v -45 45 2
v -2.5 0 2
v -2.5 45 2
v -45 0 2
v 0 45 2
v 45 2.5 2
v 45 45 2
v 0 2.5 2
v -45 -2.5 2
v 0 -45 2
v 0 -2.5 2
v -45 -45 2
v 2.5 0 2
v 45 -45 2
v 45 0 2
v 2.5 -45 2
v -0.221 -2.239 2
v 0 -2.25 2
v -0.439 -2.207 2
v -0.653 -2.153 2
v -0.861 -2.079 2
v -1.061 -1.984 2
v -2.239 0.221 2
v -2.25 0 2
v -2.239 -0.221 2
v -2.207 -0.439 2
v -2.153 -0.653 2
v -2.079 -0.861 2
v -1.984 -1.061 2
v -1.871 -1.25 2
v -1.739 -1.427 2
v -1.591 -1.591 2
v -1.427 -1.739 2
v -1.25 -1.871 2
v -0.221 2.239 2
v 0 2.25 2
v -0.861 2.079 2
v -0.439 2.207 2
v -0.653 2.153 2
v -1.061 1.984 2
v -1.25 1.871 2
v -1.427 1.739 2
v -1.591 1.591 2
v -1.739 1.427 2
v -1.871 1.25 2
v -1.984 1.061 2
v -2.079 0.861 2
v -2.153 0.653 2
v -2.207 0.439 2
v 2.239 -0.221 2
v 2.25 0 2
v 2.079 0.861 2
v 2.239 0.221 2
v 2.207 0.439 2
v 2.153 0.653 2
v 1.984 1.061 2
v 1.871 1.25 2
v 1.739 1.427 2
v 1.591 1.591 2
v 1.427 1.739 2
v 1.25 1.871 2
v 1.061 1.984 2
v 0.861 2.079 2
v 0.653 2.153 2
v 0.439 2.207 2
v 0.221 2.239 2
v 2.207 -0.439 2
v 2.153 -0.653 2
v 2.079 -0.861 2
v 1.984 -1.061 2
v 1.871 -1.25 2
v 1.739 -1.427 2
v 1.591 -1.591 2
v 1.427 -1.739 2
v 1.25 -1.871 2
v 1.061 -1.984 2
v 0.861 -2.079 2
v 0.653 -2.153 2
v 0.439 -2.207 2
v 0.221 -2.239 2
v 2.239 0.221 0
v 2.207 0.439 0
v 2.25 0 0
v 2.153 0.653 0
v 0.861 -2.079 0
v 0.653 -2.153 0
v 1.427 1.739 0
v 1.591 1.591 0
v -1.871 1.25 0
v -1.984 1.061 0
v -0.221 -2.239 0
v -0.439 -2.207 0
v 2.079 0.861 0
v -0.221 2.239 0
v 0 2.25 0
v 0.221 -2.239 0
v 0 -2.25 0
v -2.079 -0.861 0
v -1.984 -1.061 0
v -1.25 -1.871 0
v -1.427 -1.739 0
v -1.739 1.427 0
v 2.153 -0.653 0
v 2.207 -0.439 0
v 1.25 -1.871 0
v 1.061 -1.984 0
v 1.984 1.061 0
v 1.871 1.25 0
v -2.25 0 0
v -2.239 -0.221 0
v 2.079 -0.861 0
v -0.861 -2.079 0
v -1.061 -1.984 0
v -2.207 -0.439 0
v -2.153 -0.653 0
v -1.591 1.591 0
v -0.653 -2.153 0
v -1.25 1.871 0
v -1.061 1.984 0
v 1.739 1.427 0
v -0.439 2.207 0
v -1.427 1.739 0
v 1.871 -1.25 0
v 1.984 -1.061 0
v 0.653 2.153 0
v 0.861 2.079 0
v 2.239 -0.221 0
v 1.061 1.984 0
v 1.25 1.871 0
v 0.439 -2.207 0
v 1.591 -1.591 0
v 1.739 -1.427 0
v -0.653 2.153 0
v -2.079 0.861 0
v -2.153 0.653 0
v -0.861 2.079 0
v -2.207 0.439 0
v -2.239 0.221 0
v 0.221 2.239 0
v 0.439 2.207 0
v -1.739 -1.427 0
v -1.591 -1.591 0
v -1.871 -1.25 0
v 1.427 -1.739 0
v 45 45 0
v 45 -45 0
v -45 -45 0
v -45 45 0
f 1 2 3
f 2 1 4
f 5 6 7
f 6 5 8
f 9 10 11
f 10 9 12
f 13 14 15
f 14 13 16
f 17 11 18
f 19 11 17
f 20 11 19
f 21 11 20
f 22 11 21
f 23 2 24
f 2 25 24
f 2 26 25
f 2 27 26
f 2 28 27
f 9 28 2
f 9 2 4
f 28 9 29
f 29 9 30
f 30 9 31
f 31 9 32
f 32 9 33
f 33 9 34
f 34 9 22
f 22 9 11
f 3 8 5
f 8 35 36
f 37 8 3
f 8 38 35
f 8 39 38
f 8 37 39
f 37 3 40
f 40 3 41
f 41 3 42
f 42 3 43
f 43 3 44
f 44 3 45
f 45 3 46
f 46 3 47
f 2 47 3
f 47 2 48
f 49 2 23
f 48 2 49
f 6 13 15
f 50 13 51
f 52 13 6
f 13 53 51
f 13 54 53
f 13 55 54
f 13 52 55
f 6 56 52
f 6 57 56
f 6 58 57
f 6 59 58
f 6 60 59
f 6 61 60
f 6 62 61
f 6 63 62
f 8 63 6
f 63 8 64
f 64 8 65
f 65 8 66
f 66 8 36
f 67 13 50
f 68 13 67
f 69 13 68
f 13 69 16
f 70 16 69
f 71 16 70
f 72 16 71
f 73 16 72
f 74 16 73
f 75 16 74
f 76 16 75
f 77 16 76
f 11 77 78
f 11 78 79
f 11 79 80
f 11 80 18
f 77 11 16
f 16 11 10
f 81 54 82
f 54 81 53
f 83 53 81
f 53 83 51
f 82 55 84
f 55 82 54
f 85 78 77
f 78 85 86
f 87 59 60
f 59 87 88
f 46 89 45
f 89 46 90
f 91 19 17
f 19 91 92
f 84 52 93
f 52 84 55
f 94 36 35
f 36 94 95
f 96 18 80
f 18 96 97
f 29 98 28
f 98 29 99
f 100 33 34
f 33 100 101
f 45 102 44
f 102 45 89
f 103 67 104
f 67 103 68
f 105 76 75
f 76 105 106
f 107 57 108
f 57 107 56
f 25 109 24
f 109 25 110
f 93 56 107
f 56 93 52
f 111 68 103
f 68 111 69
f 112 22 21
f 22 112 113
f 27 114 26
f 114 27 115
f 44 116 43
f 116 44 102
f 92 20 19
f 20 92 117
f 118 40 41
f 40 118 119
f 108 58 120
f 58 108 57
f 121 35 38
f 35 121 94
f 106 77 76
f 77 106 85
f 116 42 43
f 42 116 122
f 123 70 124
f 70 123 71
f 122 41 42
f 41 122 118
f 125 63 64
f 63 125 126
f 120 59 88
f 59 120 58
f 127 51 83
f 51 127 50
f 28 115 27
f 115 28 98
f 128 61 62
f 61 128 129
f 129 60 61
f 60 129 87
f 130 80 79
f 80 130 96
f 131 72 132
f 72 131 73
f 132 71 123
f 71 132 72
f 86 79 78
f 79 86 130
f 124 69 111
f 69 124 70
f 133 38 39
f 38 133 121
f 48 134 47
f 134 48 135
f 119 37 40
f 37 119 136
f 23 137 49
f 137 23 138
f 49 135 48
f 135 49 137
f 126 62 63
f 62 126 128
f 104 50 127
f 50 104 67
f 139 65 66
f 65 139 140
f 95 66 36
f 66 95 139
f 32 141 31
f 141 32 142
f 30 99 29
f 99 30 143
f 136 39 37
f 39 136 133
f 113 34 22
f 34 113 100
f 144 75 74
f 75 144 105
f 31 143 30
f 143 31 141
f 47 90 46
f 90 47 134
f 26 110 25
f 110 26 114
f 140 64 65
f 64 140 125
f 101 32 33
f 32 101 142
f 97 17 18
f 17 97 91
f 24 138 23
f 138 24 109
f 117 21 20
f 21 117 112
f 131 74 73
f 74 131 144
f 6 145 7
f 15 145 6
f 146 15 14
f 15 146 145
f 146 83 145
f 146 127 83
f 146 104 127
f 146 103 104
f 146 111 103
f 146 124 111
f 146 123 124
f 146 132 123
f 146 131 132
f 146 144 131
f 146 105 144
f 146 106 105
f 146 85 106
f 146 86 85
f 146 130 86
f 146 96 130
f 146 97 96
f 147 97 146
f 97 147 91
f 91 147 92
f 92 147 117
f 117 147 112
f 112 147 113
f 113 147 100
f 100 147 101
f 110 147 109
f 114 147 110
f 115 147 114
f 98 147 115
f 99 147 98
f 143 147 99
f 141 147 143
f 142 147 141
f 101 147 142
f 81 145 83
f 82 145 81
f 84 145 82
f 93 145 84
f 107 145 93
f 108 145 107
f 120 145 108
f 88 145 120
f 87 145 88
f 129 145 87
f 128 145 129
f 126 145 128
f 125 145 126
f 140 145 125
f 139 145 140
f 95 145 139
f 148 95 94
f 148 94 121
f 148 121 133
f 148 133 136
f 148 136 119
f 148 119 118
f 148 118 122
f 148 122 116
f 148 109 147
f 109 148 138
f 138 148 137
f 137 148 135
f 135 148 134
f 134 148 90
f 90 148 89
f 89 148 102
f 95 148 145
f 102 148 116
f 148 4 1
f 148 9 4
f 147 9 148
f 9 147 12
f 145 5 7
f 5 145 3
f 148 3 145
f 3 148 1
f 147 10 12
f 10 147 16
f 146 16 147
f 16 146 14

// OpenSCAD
// Magnetic stirrer housing - upside-down open box over a 80 mm PC fan
// Print orientation: top plate on bed (z = 0), walls rise to open top (z = 40)

// ---------- Parameters ----------
plate_t      = 2;     // top plate thickness
wall_t       = 2.5;   // wall thickness
box_h        = 40;    // total height of box (open top)
outer_x      = 90;    // outer size in X
outer_y      = 90;    // outer size in Y
screw_d      = 4.5;   // M4 screw hole diameter
screw_pitch  = 71.5;  // square pattern pitch for screw holes
notch_w      = 12;    // cable notch width
notch_depth  = 8;     // cable notch depth from open edge (z = 32 to 40)
eps          = 0.5;   // cutter overshoot past faces

$fn = 64;

// ---------- Model ----------
difference() {
    // Closed top plate
    translate([-outer_x/2, -outer_y/2, 0])
        cube([outer_x, outer_y, plate_t]);

    // Four walls, open top, with screw holes through the top plate
    for (i = [0 : 3]) {
        rotate([0, 0, i * 90])
            translate([0, 0, plate_t])
                cube([outer_x, wall_t, box_h - plate_t]);
    }

    // Screw holes, centred on the plate
    for (j = [0 : 3]) {
        for (k = [0 : 3]) {
            x = (j - 1) * screw_pitch;
            y = (k - 1) * screw_pitch;
            translate([x, y, -eps])
                cylinder(d = screw_d, h = plate_t + 2 * eps);
        }
    }

    // Cable notch in one wall, centred along the wall
    translate([-outer_x/2 + notch_w/2, -wall_t/2, box_h - notch_depth])
        cube([notch_w, wall_t, notch_depth]);
}
